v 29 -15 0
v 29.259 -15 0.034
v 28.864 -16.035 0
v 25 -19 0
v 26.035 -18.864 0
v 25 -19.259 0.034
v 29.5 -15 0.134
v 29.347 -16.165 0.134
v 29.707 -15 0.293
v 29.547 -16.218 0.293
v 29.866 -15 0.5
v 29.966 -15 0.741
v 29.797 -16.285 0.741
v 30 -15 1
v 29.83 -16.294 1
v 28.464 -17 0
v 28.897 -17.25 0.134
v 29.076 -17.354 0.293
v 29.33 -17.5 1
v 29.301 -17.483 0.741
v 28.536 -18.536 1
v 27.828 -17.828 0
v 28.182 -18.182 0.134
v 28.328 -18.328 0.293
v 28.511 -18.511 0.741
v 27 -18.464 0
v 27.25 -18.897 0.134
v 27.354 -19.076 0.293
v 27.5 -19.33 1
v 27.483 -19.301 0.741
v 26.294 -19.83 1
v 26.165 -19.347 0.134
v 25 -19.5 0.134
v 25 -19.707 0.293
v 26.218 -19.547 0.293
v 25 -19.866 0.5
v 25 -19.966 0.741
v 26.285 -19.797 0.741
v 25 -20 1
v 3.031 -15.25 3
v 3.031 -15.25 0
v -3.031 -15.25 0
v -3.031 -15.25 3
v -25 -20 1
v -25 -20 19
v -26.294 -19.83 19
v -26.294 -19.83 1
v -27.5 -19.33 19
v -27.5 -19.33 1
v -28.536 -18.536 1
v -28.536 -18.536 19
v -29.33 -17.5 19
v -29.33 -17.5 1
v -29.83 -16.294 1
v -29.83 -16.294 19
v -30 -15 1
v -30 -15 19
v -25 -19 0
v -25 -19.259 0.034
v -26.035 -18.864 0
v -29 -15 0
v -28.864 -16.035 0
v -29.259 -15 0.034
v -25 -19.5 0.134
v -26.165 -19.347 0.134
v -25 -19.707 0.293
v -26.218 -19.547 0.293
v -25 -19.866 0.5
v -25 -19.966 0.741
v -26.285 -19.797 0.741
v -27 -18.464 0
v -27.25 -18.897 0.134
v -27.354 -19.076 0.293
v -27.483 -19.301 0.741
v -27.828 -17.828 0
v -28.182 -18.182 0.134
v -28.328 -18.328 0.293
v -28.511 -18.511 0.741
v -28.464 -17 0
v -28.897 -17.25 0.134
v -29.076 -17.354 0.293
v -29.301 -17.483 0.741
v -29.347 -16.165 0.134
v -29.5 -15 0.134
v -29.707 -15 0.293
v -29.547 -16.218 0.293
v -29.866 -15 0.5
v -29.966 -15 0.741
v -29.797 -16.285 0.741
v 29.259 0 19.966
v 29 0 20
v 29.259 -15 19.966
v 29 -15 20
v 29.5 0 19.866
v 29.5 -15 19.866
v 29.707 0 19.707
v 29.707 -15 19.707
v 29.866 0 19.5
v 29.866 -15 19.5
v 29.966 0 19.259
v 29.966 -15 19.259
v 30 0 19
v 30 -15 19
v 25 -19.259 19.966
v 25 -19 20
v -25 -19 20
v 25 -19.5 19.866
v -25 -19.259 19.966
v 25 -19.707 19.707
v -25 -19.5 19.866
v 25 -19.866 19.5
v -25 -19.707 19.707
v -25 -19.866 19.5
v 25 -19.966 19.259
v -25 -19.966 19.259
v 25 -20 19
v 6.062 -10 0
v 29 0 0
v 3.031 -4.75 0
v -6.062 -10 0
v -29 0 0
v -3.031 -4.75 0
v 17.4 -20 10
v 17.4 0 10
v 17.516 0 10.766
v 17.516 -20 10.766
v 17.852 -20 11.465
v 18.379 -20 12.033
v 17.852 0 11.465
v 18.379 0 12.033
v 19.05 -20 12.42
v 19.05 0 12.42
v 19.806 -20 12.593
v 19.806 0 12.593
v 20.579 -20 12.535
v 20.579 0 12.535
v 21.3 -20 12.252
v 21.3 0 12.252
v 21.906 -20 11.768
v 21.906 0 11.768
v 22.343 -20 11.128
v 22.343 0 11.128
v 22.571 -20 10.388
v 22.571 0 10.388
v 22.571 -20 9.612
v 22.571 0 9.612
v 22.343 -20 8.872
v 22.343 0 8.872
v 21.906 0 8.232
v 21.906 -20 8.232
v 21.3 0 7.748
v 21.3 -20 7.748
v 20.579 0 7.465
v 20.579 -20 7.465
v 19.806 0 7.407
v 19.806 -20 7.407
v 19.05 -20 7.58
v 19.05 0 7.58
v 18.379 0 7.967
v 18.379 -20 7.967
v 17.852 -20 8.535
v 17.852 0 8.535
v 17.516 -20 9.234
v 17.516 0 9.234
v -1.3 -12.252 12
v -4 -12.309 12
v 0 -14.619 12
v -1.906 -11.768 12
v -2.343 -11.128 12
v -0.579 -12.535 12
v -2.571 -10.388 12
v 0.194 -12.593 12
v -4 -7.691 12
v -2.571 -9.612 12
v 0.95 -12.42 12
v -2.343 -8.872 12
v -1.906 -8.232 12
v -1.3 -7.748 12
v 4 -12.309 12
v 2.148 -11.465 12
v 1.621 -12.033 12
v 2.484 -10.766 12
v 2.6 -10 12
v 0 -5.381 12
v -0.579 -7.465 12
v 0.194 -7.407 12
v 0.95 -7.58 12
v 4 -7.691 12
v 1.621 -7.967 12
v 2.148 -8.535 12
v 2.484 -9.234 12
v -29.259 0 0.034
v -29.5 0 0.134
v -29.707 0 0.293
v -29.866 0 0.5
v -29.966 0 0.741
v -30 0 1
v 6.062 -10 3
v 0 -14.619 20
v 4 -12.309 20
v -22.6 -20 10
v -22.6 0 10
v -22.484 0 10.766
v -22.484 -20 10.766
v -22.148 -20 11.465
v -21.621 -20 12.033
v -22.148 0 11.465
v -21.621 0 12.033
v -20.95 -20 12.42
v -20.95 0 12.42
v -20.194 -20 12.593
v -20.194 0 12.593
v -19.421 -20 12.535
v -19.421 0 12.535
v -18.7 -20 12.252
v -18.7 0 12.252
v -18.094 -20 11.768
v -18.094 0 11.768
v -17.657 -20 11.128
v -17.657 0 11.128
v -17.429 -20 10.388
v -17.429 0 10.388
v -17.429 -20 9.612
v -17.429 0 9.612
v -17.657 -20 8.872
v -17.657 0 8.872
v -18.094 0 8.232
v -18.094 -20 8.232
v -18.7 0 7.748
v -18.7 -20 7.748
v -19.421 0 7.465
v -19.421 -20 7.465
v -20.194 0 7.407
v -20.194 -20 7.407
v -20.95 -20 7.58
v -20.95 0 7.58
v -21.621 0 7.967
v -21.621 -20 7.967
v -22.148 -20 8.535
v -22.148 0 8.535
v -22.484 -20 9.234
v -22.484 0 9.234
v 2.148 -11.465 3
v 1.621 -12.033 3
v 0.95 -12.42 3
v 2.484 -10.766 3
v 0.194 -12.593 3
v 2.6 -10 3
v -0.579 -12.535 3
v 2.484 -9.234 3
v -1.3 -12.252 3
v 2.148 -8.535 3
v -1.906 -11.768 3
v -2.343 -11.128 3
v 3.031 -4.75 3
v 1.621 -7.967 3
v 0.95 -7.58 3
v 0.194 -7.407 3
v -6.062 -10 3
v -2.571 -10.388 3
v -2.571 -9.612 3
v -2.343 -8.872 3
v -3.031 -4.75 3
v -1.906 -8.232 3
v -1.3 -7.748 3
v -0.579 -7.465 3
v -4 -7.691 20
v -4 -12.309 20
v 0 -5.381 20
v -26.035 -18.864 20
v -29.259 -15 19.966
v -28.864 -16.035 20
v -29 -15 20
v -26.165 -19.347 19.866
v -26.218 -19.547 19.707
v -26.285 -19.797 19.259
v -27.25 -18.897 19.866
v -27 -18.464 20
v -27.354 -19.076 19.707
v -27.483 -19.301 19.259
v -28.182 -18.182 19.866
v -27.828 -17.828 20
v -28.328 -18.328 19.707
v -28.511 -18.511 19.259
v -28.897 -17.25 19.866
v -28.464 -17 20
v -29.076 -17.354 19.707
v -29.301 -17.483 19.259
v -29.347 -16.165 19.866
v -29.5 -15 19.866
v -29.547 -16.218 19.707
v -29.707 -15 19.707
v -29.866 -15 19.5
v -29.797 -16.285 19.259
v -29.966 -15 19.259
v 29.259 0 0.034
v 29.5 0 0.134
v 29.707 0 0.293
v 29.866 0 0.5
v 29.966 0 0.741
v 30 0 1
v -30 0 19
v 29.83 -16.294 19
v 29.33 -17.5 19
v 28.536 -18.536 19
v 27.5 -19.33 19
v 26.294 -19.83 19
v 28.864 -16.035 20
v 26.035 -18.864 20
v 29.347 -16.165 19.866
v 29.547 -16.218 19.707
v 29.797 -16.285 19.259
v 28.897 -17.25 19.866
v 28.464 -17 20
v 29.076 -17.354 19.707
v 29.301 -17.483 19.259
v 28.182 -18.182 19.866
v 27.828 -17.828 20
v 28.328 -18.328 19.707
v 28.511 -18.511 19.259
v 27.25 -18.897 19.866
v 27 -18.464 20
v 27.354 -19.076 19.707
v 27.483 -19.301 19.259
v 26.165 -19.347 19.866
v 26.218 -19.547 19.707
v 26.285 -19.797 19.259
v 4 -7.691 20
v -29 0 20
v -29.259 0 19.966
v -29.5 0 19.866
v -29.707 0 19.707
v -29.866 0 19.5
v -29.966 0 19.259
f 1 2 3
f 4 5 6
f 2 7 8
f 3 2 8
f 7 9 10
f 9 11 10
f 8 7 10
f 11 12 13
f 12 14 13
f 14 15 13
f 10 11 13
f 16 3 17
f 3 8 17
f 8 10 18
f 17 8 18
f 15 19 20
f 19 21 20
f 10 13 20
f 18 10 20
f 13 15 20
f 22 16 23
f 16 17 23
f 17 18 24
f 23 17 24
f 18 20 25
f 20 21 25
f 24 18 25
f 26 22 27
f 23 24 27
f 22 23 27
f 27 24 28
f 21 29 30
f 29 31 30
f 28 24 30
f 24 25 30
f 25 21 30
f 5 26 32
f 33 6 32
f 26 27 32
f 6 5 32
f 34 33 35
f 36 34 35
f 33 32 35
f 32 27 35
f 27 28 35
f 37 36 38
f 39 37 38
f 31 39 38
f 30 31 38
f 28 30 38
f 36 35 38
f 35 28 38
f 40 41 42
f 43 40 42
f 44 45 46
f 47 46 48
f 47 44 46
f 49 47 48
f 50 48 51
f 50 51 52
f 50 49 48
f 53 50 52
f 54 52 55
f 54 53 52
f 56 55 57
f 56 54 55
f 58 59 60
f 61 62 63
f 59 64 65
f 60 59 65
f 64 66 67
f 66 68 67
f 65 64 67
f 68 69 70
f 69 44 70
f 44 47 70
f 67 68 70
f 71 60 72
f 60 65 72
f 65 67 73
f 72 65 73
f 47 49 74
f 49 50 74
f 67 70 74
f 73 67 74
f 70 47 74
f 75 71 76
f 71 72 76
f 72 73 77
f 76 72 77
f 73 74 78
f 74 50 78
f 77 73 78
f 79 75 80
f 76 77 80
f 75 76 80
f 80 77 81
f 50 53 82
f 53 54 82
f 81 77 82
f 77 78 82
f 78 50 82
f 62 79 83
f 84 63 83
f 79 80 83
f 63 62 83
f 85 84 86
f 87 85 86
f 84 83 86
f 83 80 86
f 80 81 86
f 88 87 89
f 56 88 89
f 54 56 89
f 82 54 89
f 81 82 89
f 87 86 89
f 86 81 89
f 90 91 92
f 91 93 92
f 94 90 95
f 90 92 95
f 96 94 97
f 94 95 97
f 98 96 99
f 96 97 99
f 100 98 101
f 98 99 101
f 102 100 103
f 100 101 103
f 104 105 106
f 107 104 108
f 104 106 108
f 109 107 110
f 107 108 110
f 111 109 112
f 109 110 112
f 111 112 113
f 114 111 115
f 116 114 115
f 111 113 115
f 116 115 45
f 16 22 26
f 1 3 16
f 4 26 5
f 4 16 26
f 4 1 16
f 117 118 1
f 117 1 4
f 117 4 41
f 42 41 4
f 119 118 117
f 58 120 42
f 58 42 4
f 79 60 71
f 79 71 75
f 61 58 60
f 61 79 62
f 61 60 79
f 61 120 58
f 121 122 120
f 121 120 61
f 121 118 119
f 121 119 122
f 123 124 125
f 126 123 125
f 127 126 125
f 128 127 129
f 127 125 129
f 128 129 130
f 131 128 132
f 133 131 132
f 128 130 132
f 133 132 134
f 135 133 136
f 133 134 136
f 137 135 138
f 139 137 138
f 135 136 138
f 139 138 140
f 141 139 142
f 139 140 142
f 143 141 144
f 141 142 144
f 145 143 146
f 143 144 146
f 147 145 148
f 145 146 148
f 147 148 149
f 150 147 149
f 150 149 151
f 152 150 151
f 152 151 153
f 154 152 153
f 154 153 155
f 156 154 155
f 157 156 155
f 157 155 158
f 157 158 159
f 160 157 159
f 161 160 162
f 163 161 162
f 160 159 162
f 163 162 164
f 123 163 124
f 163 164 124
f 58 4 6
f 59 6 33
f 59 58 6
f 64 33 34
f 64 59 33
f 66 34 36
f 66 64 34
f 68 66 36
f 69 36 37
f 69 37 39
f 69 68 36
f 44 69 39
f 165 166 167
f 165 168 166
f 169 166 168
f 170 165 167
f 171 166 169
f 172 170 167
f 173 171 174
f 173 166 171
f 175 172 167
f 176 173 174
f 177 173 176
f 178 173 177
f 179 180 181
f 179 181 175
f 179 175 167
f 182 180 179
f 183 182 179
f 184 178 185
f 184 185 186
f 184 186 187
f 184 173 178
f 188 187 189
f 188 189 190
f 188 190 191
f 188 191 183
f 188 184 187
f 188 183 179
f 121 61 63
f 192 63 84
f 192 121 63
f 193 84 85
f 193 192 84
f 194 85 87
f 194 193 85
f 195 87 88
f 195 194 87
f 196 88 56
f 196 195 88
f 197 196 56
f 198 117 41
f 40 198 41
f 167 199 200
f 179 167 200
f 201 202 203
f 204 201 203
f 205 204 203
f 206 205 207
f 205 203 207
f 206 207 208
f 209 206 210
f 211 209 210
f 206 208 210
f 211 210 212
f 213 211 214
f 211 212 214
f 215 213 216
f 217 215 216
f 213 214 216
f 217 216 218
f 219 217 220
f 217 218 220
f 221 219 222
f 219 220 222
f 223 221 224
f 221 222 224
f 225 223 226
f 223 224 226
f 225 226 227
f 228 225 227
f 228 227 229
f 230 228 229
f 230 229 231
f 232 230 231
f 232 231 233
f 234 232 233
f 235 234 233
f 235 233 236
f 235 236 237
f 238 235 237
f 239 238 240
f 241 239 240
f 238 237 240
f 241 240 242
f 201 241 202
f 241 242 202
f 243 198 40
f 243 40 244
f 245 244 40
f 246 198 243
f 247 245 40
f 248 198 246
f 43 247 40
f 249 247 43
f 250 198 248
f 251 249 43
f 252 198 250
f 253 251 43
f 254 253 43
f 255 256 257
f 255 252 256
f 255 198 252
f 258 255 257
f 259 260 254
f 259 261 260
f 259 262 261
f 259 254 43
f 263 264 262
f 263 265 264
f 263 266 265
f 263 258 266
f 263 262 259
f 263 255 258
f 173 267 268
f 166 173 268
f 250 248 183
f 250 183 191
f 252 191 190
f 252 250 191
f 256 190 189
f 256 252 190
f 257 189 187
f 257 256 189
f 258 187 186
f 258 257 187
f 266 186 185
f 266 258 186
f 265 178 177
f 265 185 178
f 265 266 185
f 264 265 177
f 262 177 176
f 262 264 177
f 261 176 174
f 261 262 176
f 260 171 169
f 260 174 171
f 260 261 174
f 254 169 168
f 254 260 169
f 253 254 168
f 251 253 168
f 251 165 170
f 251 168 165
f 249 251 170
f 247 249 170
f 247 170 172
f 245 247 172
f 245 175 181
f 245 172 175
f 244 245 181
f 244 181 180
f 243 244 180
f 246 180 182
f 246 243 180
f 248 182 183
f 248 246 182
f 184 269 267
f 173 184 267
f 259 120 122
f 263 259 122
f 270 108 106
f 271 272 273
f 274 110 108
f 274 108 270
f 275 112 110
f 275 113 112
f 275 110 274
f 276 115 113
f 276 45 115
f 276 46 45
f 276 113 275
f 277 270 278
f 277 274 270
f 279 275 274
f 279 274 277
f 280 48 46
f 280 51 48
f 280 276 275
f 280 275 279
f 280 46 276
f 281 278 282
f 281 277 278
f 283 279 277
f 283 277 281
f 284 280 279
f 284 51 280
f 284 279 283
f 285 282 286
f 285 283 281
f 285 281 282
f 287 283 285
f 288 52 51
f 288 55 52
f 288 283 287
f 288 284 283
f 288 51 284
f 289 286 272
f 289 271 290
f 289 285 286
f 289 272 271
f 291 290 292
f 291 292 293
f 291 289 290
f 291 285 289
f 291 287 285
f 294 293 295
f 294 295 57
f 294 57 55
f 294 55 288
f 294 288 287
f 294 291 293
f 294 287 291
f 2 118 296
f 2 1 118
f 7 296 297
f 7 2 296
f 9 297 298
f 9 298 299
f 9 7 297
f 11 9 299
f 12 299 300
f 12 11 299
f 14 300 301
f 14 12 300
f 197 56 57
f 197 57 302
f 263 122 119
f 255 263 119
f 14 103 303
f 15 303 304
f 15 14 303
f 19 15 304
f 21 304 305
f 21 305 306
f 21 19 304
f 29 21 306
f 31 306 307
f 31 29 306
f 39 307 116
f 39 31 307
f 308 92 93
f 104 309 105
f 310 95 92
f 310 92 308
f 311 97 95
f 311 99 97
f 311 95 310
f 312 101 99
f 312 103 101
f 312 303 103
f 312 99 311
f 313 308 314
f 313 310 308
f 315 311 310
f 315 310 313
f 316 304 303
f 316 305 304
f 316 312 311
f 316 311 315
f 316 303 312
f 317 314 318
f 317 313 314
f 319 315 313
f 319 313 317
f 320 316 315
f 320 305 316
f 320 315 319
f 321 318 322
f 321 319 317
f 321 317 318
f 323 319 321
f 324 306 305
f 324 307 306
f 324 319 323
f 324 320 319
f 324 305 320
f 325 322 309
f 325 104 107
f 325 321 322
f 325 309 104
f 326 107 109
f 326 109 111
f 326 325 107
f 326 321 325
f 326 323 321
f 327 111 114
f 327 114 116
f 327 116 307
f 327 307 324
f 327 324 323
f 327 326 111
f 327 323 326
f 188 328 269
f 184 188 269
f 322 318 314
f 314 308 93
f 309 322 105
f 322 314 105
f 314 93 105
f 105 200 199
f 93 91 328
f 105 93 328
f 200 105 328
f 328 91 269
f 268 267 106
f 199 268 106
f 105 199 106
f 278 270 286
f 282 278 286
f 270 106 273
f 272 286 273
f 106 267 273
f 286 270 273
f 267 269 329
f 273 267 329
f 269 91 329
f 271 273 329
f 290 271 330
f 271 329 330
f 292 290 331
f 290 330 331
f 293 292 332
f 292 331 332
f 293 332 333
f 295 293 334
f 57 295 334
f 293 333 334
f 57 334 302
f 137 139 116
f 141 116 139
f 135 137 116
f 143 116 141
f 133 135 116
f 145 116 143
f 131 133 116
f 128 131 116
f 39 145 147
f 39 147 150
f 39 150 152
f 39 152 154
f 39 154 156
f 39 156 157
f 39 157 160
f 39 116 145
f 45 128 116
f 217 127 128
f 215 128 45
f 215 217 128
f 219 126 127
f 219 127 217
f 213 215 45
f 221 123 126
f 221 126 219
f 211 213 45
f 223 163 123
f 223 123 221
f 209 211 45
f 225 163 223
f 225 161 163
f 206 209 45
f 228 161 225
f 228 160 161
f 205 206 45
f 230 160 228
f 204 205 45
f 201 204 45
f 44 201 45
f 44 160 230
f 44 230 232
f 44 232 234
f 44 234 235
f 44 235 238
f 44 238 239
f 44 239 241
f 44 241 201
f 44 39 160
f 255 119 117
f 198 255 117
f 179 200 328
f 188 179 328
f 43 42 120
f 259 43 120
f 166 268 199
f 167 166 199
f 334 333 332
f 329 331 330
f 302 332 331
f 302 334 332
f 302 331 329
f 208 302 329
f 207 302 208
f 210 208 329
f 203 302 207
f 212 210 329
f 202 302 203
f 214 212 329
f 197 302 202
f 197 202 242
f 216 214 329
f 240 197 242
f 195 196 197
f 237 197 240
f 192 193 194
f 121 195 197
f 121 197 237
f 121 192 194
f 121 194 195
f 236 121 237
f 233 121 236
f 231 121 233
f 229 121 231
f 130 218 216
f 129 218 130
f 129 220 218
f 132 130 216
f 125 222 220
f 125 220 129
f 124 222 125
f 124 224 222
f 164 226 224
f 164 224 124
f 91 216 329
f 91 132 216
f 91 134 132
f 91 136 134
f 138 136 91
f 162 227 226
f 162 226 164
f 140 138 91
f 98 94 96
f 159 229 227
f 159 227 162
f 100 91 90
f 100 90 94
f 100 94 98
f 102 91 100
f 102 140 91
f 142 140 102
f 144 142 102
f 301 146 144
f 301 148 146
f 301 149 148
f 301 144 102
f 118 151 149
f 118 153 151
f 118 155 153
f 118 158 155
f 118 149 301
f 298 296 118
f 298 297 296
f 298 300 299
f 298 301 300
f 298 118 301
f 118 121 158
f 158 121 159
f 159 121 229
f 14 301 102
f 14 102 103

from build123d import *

# Parameters (mm, degrees)
SKETCH1_R           = 2.6
BOSS_EXTRUDE1_DEPTH = 20
SKETCH2_R           = 2.6
CUT_EXTRUDE1_DEPTH  = 20
CUT_EXTRUDE2_DEPTH  = 3
CUT_EXTRUDE3_DEPTH  = 8
FILLET1_R           = 1


with BuildPart() as part:
    # Sketch1 → Boss-Extrude1 (new body)
    with BuildSketch(Plane.XY):
        with BuildLine():
            Line((-30, 0), (30, 0))
            Line((30, 0), (30, -15))
            ThreePointArc((30, -15), (28.535533906, -18.535533906), (25, -20))
            Line((25, -20), (-25, -20))
            ThreePointArc((-25, -20), (-28.535533906, -18.535533906), (-30, -15))
            Line((-30, -15), (-30, 0))
        make_face()
        with Locations((0, -10)):
            Circle(SKETCH1_R, mode=Mode.SUBTRACT)
    extrude(amount=BOSS_EXTRUDE1_DEPTH)

    # Sketch2 → Cut-Extrude1 (cut)
    with BuildSketch(Plane(origin=(0, 0, 0), x_dir=(1, 0, 0), z_dir=(0, 1, 0))):
        with Locations(Location((-20, -10, 0), (0, 0, 180))):
            Circle(SKETCH2_R)
        with Locations(Location((20, -10, 0), (0, 0, 180))):
            Circle(SKETCH2_R)
    extrude(amount=-CUT_EXTRUDE1_DEPTH, mode=Mode.SUBTRACT)

    # Sketch3 → Cut-Extrude2 (cut)
    with BuildSketch(Plane(origin=(0, 0, 0), x_dir=(-1, 0, 0), z_dir=(0, 0, -1))):
        Polygon((6.062177826, -10), (3.031088913, -4.75), (-3.031088913, -4.75), (-6.062177826, -10), (-3.031088913, -15.25), (3.031088913, -15.25), align=None)
    extrude(amount=-CUT_EXTRUDE2_DEPTH, mode=Mode.SUBTRACT)

    # Sketch4 → Cut-Extrude3 (cut)
    with BuildSketch(Plane.XY.offset(20)):
        Polygon((-4, -7.690598923), (-4, -12.309401077), (0, -14.618802154), (4, -12.309401077), (4, -7.690598923), (0, -5.381197846), align=None)
    extrude(amount=-CUT_EXTRUDE3_DEPTH, mode=Mode.SUBTRACT)

    # Fillet1
    fillet1_edges = [part.edges().sort_by_distance(p)[0] for p in [
        (0, -20, 20),
        (28.535533906, -18.535533906, 20),
        (30, -7.5, 20),
        (-30, -7.5, 20),
        (30, -7.5, 0),
        (28.535533906, -18.535533906, 0),
        (-28.535533906, -18.535533906, 20),
        (0, -20, 0),
        (-28.535533906, -18.535533906, 0),
        (-30, -7.5, 0),
    ]]
    fillet(fillet1_edges, radius=FILLET1_R)


solid = part.part
